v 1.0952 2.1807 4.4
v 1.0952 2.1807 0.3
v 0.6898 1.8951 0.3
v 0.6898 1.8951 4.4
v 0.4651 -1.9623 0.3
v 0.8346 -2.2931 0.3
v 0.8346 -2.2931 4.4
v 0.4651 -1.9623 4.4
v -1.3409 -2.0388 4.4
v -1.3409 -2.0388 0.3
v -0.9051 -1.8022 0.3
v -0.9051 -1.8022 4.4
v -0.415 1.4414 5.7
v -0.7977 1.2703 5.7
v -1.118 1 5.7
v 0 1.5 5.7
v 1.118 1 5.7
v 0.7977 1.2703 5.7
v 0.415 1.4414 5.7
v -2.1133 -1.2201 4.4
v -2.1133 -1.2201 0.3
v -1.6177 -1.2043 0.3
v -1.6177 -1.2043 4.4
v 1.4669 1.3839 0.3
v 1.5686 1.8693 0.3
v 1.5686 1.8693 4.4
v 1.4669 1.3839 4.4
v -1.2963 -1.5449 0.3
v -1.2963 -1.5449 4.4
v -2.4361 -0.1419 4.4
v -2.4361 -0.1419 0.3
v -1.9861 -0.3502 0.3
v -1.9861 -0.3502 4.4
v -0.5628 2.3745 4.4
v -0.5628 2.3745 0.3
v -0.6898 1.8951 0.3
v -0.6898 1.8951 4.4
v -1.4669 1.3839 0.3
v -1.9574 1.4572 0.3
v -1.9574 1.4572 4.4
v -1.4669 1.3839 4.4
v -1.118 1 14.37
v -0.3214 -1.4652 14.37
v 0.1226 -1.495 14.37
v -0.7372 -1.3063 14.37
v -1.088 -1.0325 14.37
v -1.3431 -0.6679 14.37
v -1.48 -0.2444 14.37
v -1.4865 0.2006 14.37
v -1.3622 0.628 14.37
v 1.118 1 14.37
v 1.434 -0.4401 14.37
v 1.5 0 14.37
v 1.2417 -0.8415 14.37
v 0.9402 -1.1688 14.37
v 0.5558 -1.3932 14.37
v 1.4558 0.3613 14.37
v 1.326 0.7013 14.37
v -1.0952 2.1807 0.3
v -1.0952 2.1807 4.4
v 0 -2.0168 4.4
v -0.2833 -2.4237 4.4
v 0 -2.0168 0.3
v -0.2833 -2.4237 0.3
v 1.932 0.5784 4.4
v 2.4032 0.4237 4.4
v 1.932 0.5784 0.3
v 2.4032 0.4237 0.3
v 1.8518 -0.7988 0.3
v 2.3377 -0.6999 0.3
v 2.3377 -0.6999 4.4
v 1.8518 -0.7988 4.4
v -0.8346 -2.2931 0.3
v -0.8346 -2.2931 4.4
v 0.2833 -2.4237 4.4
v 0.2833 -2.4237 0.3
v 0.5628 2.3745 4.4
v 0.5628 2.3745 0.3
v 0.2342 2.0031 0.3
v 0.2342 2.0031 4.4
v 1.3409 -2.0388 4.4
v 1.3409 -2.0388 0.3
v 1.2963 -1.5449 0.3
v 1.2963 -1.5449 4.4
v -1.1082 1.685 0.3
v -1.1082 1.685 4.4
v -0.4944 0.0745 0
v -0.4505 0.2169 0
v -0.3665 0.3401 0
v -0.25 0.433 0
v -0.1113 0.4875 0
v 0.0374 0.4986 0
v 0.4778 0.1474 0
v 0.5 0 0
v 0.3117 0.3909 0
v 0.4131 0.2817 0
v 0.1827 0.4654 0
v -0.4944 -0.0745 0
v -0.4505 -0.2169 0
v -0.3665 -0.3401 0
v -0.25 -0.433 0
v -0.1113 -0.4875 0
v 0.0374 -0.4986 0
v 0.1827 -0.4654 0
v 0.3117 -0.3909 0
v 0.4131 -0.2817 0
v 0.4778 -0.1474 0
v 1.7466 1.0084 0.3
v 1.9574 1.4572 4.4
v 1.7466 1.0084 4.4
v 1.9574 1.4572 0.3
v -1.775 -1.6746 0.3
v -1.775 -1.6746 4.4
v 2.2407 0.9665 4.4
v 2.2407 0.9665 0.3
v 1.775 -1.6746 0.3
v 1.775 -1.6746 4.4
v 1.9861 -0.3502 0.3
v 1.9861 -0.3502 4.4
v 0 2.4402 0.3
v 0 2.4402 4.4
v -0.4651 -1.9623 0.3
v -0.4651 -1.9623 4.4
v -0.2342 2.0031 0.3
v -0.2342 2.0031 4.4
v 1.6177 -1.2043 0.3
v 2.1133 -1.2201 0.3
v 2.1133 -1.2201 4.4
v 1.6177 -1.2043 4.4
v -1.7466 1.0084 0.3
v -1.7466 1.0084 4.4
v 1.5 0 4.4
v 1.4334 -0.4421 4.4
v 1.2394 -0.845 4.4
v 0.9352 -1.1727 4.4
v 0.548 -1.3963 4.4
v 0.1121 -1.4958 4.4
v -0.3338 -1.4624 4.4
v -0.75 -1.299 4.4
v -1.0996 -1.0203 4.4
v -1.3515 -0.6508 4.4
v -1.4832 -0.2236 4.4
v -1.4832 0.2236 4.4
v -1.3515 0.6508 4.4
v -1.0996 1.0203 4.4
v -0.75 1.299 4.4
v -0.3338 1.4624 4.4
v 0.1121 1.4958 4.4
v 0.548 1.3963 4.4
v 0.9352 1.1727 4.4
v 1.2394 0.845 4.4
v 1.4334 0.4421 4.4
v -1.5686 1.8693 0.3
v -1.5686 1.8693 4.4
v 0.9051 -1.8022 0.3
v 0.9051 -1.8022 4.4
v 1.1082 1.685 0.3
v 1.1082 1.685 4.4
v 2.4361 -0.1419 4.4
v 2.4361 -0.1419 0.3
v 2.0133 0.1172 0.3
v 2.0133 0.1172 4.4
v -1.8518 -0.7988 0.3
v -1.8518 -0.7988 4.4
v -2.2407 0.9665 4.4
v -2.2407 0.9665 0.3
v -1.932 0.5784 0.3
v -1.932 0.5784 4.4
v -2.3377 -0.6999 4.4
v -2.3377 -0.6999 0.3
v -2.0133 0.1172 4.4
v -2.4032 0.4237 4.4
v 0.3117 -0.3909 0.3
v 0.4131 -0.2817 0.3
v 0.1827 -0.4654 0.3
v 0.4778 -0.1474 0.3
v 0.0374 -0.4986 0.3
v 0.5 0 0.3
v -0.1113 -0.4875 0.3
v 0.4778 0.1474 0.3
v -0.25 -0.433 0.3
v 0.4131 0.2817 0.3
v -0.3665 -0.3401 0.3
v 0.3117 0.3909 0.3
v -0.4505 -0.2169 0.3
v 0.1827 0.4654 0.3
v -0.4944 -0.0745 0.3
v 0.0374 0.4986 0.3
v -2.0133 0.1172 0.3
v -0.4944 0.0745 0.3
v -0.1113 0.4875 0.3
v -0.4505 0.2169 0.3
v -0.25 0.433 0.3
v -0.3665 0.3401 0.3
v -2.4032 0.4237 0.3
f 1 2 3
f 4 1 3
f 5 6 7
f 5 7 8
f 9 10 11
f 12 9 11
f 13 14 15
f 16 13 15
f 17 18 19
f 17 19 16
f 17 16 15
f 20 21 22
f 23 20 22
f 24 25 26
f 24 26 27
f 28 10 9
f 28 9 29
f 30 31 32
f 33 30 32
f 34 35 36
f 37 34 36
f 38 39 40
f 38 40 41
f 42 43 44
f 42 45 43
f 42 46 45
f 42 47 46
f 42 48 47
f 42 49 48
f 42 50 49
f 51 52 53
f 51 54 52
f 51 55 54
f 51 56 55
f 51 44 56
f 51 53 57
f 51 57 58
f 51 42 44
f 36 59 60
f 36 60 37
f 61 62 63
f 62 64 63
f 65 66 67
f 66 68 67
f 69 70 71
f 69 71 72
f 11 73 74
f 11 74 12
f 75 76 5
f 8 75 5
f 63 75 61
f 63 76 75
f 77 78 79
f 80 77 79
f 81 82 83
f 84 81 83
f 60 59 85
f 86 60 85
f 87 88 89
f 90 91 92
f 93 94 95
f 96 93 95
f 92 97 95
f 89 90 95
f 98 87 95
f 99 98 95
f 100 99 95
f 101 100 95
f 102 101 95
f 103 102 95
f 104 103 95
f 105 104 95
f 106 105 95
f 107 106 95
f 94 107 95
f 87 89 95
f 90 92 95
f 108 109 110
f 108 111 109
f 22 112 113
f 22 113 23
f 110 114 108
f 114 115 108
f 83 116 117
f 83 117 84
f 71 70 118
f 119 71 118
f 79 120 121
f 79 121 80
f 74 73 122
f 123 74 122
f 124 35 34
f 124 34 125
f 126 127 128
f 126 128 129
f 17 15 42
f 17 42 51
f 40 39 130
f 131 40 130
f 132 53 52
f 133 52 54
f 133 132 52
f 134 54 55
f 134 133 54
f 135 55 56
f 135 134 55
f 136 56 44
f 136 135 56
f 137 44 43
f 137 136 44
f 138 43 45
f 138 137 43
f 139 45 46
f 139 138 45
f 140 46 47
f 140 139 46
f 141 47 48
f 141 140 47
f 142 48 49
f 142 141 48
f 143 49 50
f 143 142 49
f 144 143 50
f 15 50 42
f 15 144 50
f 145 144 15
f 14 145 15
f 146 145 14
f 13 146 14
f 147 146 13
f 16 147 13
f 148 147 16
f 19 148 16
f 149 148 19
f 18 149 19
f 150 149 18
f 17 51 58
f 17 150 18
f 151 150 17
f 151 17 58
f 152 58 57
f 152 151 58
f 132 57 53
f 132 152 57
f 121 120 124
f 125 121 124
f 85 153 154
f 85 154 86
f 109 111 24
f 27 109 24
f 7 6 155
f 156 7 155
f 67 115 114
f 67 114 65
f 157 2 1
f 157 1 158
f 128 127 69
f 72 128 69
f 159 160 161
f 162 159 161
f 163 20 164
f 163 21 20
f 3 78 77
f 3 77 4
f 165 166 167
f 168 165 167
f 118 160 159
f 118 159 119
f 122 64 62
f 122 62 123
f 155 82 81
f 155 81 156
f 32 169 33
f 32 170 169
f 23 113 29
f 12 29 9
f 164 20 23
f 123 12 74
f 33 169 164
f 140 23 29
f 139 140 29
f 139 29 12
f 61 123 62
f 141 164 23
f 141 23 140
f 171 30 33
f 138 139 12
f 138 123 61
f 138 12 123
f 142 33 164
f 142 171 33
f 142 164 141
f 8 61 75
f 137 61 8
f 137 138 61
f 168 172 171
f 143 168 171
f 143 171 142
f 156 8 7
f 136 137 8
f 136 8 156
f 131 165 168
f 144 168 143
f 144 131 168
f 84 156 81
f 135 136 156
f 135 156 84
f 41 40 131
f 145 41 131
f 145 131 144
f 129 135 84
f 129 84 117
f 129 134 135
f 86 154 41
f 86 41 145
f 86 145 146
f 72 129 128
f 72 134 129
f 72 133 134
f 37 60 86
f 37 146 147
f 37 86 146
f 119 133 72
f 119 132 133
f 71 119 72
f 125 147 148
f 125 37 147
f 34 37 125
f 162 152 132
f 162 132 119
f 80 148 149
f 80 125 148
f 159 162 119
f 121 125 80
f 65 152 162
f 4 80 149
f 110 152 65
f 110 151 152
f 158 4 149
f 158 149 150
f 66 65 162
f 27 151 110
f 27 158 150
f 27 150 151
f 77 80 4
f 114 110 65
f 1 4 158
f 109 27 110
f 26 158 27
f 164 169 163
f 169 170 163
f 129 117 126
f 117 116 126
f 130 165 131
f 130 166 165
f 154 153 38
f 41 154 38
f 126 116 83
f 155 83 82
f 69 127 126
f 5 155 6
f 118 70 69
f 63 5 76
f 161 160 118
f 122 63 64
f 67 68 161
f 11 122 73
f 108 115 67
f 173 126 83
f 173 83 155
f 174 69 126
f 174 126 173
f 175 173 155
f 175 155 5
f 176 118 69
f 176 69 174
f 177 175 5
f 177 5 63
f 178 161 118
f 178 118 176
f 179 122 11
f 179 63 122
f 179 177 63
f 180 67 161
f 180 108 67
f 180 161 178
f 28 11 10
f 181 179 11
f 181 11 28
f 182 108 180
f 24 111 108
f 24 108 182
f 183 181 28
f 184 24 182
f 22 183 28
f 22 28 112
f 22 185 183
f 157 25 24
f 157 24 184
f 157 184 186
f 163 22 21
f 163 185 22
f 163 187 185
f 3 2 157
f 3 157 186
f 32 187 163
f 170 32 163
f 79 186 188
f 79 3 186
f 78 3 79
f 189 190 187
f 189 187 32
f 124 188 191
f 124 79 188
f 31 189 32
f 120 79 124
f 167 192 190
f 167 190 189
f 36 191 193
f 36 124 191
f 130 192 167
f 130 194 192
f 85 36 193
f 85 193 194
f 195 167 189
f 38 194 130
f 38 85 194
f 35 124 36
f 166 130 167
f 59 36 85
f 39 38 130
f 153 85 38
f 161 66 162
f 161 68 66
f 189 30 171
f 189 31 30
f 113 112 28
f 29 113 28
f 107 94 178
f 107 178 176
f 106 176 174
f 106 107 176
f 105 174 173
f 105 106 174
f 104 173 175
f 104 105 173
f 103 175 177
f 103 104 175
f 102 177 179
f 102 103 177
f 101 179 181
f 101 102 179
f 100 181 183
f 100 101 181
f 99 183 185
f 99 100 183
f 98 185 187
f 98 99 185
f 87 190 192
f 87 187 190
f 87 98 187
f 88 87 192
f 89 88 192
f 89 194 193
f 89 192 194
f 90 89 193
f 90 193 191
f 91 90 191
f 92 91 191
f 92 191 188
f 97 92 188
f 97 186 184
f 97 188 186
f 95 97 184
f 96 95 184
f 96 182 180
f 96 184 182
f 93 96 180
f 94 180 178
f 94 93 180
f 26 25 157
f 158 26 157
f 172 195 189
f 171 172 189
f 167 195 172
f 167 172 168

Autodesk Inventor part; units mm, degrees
ref_plane "YZ Plane" through (0, 0, 0) normal (1, 0, 0) x (0, 1, 0)
ref_plane "XZ Plane" through (0, 0, 0) normal (0, 1, 0) x (-1, 0, 0)
ref_plane "XY Plane" through (0, 0, 0) normal (0, 0, 1) x (1, 0, 0)
sketch "Sketch1" plane through (0, 0, 0) normal (0, 0, 1) x (1, 0, 0)
  circle A0 centre (0, 0) radius 0.5
  dimension "d0" = 1
extrude "Extrusion1" add sketch "Sketch1" along normal blind 4.4
sketch "Sketch2" plane through (0, 0, 4.4) normal (0, 0, 1) x (1, 0, 0)
  circle A0 centre (0, 0) radius 0.5 projected
  circle A1 centre (0, 0) radius 2
  dimension "d3" = 4
extrude "Extrusion2" add sketch "Sketch2" against normal blind 4.1
sketch "Sketch4" plane through (0, 0, 4.4) normal (0, 0, 1) x (1, 0, 0)
  circle A0 centre (0, 0) radius 2 projected
  circle A1 centre (0, 0) radius 1.5
  dimension "d6" = 3
extrude "Extrusion3" add sketch "Sketch4" along normal blind 1.3 contours A1
sketch "Sketch5" plane through (0, 0, 5.7) normal (0, 0, 1) x (1, 0, 0)
  circle A0 centre (0, 0) radius 1.5 projected
  circle A1 centre (0, 0) radius 1.5
  line L0 (0, 0) -> (1.0208, 0)
  line L1 (-1.118, 1) -> (1.118, 1)
  line L2 (0, -1.5) -> (1.5, -1.5)
  dimension "d11" = 2.5
extrude "Extrusion5" add sketch "Sketch5" along normal blind 8.67 contours A0 L1 picked at (0, 0.1667)
sketch "Sketch8" plane through (0, 0, 0.3) normal (0, 0, -1) x (-1, 0, 0)
  circle A0 centre (0, 0) radius 0.5 projected
  circle A1 centre (0, 0) radius 2 projected
  line L0 (0, 0) -> (0, 5.155)
  line L1 (0, 2.4402) -> (-0.2438, 1.9851)
  line L2 (0, 2.4402) -> (0.2438, 1.9851)
  arc A2 (0.2438, 1.9851) -> (-0.2438, 1.9851) centre (0, 0) ccw
  line L3 (-0.2438, 1.9851) -> (0, 2.4402)
  line L4 (0, 2.4402) -> (0.2438, 1.9851)
  line L5 (-0.5628, 2.3745) -> (-0.695, 1.8754)
  line L6 (-0.5628, 2.3745) -> (-0.2206, 1.9878)
  arc A3 (-0.2206, 1.9878) -> (-0.695, 1.8754) centre (0, 0) ccw
  line L7 (-1.0952, 2.1807) -> (-1.1087, 1.6645)
  line L8 (-1.0952, 2.1807) -> (-0.6731, 1.8833)
  arc A4 (-0.6731, 1.8833) -> (-1.1087, 1.6645) centre (0, 0) ccw
  line L9 (-1.5686, 1.8693) -> (-1.4627, 1.364)
  line L10 (-1.5686, 1.8693) -> (-1.0893, 1.6774)
  arc A5 (-1.0893, 1.6774) -> (-1.4627, 1.364) centre (0, 0) ccw
  line L11 (-1.9574, 1.4572) -> (-1.7379, 0.9899)
  line L12 (-1.9574, 1.4572) -> (-1.4467, 1.3809)
  arc A6 (-1.4467, 1.3809) -> (-1.7379, 0.9899) centre (0, 0) ccw
  line L13 (-2.2407, 0.9665) -> (-1.9193, 0.5624)
  line L14 (-2.2407, 0.9665) -> (-1.7262, 1.0101)
  arc A7 (-1.7262, 1.0101) -> (-1.9193, 0.5624) centre (0, 0) ccw
  line L15 (-2.4032, 0.4237) -> (-1.9973, 0.1046)
  line L16 (-2.4032, 0.4237) -> (-1.9126, 0.5848)
  arc A8 (-1.9126, 0.5848) -> (-1.9973, 0.1046) centre (0, 0) ccw
  line L17 (-2.4361, -0.1419) -> (-1.9676, -0.3588)
  line L18 (-2.4361, -0.1419) -> (-1.9959, 0.1279)
  arc A9 (-1.9959, 0.1279) -> (-1.9676, -0.3588) centre (0, 0) ccw
  line L19 (-2.3377, -0.6999) -> (-1.8318, -0.8029)
  line L20 (-2.3377, -0.6999) -> (-1.9716, -0.3358)
  arc A10 (-1.9716, -0.3358) -> (-1.8318, -0.8029) centre (0, 0) ccw
  line L21 (-2.1133, -1.2201) -> (-1.5973, -1.2037)
  line L22 (-2.1133, -1.2201) -> (-1.841, -0.7814)
  arc A11 (-1.841, -0.7814) -> (-1.5973, -1.2037) centre (0, 0) ccw
  line L23 (-1.775, -1.6746) -> (-1.2766, -1.5396)
  line L24 (-1.775, -1.6746) -> (-1.6112, -1.1849)
  arc A12 (-1.6112, -1.1849) -> (-1.2766, -1.5396) centre (0, 0) ccw
  line L25 (-1.3409, -2.0388) -> (-0.8872, -1.7925)
  line L26 (-1.3409, -2.0388) -> (-1.2945, -1.5246)
  arc A13 (-1.2945, -1.5246) -> (-0.8872, -1.7925) centre (0, 0) ccw
  line L27 (-0.8346, -2.2931) -> (-0.4499, -1.9487)
  line L28 (-0.8346, -2.2931) -> (-0.908, -1.782)
  arc A14 (-0.908, -1.782) -> (-0.4499, -1.9487) centre (0, 0) ccw
  line L29 (-0.2833, -2.4237) -> (0.0117, -2)
  line L30 (-0.2833, -2.4237) -> (-0.4726, -1.9434)
  arc A15 (-0.4726, -1.9434) -> (0.0117, -2) centre (0, 0) ccw
  line L31 (0.2833, -2.4237) -> (0.4726, -1.9434)
  line L32 (0.2833, -2.4237) -> (-0.0117, -2)
  arc A16 (-0.0117, -2) -> (0.4726, -1.9434) centre (0, 0) ccw
  line L33 (0.8346, -2.2931) -> (0.908, -1.782)
  line L34 (0.8346, -2.2931) -> (0.4499, -1.9487)
  arc A17 (0.4499, -1.9487) -> (0.908, -1.782) centre (0, 0) ccw
  line L35 (1.3409, -2.0388) -> (1.2945, -1.5246)
  line L36 (1.3409, -2.0388) -> (0.8872, -1.7925)
  arc A18 (0.8872, -1.7925) -> (1.2945, -1.5246) centre (0, 0) ccw
  line L37 (1.775, -1.6746) -> (1.6112, -1.1849)
  line L38 (1.775, -1.6746) -> (1.2766, -1.5396)
  arc A19 (1.2766, -1.5396) -> (1.6112, -1.1849) centre (0, 0) ccw
  line L39 (2.1133, -1.2201) -> (1.841, -0.7814)
  line L40 (2.1133, -1.2201) -> (1.5973, -1.2037)
  arc A20 (1.5973, -1.2037) -> (1.841, -0.7814) centre (0, 0) ccw
  line L41 (2.3377, -0.6999) -> (1.9716, -0.3358)
  line L42 (2.3377, -0.6999) -> (1.8318, -0.8029)
  arc A21 (1.8318, -0.8029) -> (1.9716, -0.3358) centre (0, 0) ccw
  line L43 (2.4361, -0.1419) -> (1.9959, 0.1279)
  line L44 (2.4361, -0.1419) -> (1.9676, -0.3588)
  arc A22 (1.9676, -0.3588) -> (1.9959, 0.1279) centre (0, 0) ccw
  line L45 (2.4032, 0.4237) -> (1.9126, 0.5848)
  line L46 (2.4032, 0.4237) -> (1.9973, 0.1046)
  arc A23 (1.9973, 0.1046) -> (1.9126, 0.5848) centre (0, 0) ccw
  line L47 (2.2407, 0.9665) -> (1.7262, 1.0101)
  line L48 (2.2407, 0.9665) -> (1.9193, 0.5624)
  arc A24 (1.9193, 0.5624) -> (1.7262, 1.0101) centre (0, 0) ccw
  line L49 (1.9574, 1.4572) -> (1.4467, 1.3809)
  line L50 (1.9574, 1.4572) -> (1.7379, 0.9899)
  arc A25 (1.7379, 0.9899) -> (1.4467, 1.3809) centre (0, 0) ccw
  line L51 (1.5686, 1.8693) -> (1.0893, 1.6774)
  line L52 (1.5686, 1.8693) -> (1.4627, 1.364)
  arc A26 (1.4627, 1.364) -> (1.0893, 1.6774) centre (0, 0) ccw
  line L53 (1.0952, 2.1807) -> (0.6731, 1.8833)
  line L54 (1.0952, 2.1807) -> (1.1087, 1.6645)
  arc A27 (1.1087, 1.6645) -> (0.6731, 1.8833) centre (0, 0) ccw
  line L55 (0.5628, 2.3745) -> (0.2206, 1.9878)
  line L56 (0.5628, 2.3745) -> (0.695, 1.8754)
  arc A28 (0.695, 1.8754) -> (0.2206, 1.9878) centre (0, 0) ccw
  dimension "d24" = 360
extrude "Extrusion8" add sketch "Sketch8" against normal up to surface (4.1 mm away) contours A1 L6 L1 L0 | L0 L2 L55 A1 | L55 L2 A1 | A1 L1 L6 | L2 L55 L56 L53 A1 | A1 L8 L5 L6 L1 | L53 L56 A1 | A1 L5 L8 | L56 L53 L54 L51 A1 | A1 L10 L7 L8 L5 | L51 L54 A1 | A1 L7 L10 | L54 L51 L52 L49 A1 | A1 L12 L9 L10 L7 | L49 L52 A1 | A1 L9 L12 | L52 L49 L50 L47 A1 | A1 L14 L11 L12 L9 | L47 L50 A1 | A1 L11 L14 | L50 L47 L48 L45 A1 | A1 L16 L13 L14 L11 | L45 L48 A1 | A1 L13 L16 | L48 L45 L46 L43 A1 | A1 L18 L15 L16 L13 | L43 L46 A1 | A1 L15 L18 | L46 L43 L44 L41 A1 | A1 L20 L17 L18 L15 | A1 L17 L20 | L41 L44 A1 | L41 L42 L39 A1 L44 | A1 L22 L19 L20 L17 | A1 L19 L22 | L39 L42 A1 | L39 L40 L37 A1 L42 | A1 L24 L21 L22 L19 | A1 L21 L24 | L37 L40 A1 | L37 L38 L35 A1 L40 | A1 L26 L23 L24 L21 | A1 L23 L26 | L35 L38 A1 | L35 L36 L33 A1 L38 | A1 L28 L25 L26 L23 | A1 L25 L28 | L33 L36 A1 | L33 L34 L31 A1 L36 | A1 L30 L27 L28 L25 | A1 L27 L30 | L31 L34 A1 | L31 L32 L29 A1 L34 | A1 L32 L29 L30 L27 | A1 L29 L32
properties part number "launcher.motor.shaft"
